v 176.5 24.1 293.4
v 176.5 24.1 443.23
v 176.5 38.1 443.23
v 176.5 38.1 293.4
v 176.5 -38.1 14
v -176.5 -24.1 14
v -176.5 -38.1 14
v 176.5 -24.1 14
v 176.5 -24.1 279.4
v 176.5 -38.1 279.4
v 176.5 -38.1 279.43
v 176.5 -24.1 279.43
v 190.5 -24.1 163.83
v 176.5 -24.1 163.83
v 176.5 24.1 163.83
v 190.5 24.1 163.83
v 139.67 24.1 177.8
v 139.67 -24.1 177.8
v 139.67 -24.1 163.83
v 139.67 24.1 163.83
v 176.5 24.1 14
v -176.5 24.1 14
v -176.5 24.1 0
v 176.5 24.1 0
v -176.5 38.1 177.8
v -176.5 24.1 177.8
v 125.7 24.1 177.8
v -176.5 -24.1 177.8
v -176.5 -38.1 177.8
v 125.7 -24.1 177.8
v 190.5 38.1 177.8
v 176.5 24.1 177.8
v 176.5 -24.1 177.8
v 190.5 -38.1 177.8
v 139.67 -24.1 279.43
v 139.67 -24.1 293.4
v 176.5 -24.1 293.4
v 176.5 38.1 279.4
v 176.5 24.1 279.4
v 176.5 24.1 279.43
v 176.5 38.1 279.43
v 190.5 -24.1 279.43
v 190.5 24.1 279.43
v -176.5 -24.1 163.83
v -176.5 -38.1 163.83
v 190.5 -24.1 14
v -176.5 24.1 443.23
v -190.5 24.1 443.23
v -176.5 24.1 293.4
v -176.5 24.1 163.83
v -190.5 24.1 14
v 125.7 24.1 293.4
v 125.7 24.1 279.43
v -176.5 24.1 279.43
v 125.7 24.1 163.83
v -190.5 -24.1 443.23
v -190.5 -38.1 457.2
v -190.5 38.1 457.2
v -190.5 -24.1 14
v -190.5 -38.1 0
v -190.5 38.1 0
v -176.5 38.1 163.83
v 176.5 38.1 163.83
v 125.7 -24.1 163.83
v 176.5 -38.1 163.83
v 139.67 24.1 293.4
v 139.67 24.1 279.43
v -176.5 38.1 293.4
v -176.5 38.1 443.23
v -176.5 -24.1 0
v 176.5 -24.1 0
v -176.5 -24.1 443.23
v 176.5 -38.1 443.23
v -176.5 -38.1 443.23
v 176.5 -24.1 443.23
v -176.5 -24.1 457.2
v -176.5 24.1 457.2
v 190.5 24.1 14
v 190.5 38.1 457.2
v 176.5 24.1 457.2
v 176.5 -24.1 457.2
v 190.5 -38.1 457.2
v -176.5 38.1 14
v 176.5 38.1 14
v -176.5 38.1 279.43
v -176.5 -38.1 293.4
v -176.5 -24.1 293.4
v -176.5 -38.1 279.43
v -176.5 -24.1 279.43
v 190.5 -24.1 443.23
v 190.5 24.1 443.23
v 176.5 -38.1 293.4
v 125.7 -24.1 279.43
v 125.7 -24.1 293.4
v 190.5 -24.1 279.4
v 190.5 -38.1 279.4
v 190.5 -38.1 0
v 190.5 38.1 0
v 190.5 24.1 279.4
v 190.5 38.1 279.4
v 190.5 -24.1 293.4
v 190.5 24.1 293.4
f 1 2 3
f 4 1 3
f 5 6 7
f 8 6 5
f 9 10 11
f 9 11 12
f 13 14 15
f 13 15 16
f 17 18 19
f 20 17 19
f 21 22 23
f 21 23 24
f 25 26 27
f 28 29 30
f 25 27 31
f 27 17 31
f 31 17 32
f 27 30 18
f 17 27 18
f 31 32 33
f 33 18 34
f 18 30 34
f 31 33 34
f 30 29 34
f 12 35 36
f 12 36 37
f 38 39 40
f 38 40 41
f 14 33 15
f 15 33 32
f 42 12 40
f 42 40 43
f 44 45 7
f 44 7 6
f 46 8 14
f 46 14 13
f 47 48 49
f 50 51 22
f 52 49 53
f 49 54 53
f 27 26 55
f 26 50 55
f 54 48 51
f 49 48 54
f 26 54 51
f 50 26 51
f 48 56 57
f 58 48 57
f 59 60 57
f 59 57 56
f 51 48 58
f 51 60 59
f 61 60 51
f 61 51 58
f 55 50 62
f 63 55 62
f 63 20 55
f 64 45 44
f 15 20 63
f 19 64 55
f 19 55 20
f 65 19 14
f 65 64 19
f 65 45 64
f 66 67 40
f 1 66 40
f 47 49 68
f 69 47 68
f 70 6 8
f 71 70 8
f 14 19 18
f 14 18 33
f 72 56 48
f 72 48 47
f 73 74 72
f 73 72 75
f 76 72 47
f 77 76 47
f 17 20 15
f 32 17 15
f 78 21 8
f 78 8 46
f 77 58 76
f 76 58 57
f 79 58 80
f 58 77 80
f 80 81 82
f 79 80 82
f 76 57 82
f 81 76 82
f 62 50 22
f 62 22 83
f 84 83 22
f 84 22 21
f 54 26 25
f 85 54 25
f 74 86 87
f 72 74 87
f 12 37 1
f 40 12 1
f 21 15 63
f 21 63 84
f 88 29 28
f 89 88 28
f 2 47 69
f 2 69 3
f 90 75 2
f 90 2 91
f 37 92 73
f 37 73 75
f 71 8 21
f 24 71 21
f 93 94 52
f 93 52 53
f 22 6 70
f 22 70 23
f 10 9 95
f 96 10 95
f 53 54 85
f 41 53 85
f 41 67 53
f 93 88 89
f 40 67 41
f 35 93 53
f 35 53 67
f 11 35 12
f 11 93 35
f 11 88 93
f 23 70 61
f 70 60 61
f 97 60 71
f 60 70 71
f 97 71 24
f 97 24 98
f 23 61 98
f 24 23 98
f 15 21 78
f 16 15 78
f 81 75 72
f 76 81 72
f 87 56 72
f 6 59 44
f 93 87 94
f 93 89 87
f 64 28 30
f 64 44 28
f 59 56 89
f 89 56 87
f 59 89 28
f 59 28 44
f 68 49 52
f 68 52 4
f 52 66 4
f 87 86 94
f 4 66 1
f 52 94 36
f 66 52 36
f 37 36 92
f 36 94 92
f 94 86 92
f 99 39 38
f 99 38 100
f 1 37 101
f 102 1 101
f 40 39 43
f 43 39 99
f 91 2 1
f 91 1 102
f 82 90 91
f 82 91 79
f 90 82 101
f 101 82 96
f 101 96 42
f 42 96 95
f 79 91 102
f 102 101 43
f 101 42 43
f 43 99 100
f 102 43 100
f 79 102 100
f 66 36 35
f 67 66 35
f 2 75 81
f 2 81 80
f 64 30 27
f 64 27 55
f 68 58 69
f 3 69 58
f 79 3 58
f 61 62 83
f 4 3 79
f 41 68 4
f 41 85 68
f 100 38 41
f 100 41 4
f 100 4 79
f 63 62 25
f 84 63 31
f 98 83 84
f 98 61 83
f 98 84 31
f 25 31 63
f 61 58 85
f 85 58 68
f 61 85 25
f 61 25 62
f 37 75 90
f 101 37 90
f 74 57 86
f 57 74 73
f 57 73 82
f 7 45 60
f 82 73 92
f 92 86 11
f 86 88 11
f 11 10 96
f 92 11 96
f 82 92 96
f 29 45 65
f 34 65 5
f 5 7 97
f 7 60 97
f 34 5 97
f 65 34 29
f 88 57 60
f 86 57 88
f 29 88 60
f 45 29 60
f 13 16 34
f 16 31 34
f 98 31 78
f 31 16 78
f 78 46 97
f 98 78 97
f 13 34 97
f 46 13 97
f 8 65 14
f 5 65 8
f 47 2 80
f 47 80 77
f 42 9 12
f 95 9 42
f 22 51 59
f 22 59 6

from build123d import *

# Parameters (mm, degrees)
SKETCH1_W               = 381
SKETCH1_H               = 76.2
BOSS_EXTRUDE1_DEPTH     = 14
SKETCH2_W               = 353.0000052
SKETCH2_H               = 48.2
CUT_EXTRUDE1_DEPTH      = 14
SKETCH5_W               = 381
SKETCH5_H               = 13.97
BOSS_EXTRUDE2_DEPTH     = 76.2
SKETCH6_W               = 353.0000052
SKETCH6_H               = 48.2
CUT_EXTRUDE2_DEPTH      = 76.2
SKETCH3_W               = 13.9999974
SKETCH3_H               = 14
BOSS_EXTRUDE3_DEPTH     = 429.26
SKETCH7_W               = 13.9999974
SKETCH7_H               = 101.6
CUT_EXTRUDE3_DEPTH      = 429.26
SKETCH10_W              = 13.9999974
SKETCH10_H              = 13.97
BOSS_EXTRUDE4_DEPTH     = 48.26
SKETCH11_W              = 353.0000052
SKETCH11_H              = 13.97
BOSS_EXTRUDE5_DEPTH     = 76.2
CUT_EXTRUDE4_DEPTH      = 352.863349754
CUT_EXTRUDE4_DEPTH_BACK = 352.863349754
SKETCH12_W              = 353.0000052
SKETCH12_H              = 48.2
SKETCH13_W              = 13.97
SKETCH13_H              = 13.97
BOSS_EXTRUDE6_DEPTH     = 48.26


with BuildPart() as part:
    # Sketch1 → Boss-Extrude1 (new body)
    with BuildSketch(Plane.XY):
        Rectangle(SKETCH1_W, SKETCH1_H)
    extrude(amount=BOSS_EXTRUDE1_DEPTH)

    # Sketch2 → Cut-Extrude1 (cut)
    with BuildSketch(Plane.XY.offset(14)):
        Rectangle(SKETCH2_W, SKETCH2_H)
    extrude(amount=-CUT_EXTRUDE1_DEPTH, mode=Mode.SUBTRACT)



with BuildPart() as body_2:
    # Sketch5 → Boss-Extrude2 (new body)
    with BuildSketch(Plane(origin=(0, -38.1, 0), x_dir=(1, 0, 0), z_dir=(0, 1, 0))):
        with Locations((0, -450.215)):
            Rectangle(SKETCH5_W, SKETCH5_H)
    extrude(amount=BOSS_EXTRUDE2_DEPTH)

    # Sketch6 → Cut-Extrude2 (cut)
    with BuildSketch(Plane(origin=(0, 0, 443.23), x_dir=(-1, 0, 0), z_dir=(0, 0, -1))):
        Rectangle(SKETCH6_W, SKETCH6_H)
    extrude(amount=-CUT_EXTRUDE2_DEPTH, mode=Mode.SUBTRACT)


with BuildPart() as part_1:
    add(part.part)

    add(body_2.part)  # Boss-Extrude3 merges body 2
    # Sketch3 → Boss-Extrude3 (add)
    with BuildSketch(Plane.XY.offset(14)):
        with Locations((-183.5000013, -31.1)):
            Rectangle(SKETCH3_W, SKETCH3_H)
        with Locations((-183.5000013, 31.1)):
            Rectangle(SKETCH3_W, SKETCH3_H)
        with Locations((183.5000013, -31.1)):
            Rectangle(SKETCH3_W, SKETCH3_H)
        with Locations((183.5000013, 31.1)):
            Rectangle(SKETCH3_W, SKETCH3_H)
    extrude(amount=BOSS_EXTRUDE3_DEPTH)

    # Sketch7 → Cut-Extrude3 (cut)
    with BuildSketch(Plane(origin=(0, 38.1, 0), x_dir=(1, 0, 0), z_dir=(0, 1, 0))):
        with Locations((183.5000013, -228.6)):
            Rectangle(SKETCH7_W, SKETCH7_H)
    extrude(amount=-CUT_EXTRUDE3_DEPTH, mode=Mode.SUBTRACT)

    # Sketch10 → Boss-Extrude4 (add)
    with BuildSketch(Plane(origin=(0, -24.1, 0), x_dir=(1, 0, 0), z_dir=(0, 1, 0))):
        with Locations((183.5000013, -170.815)):
            Rectangle(SKETCH10_W, SKETCH10_H)
        with Locations((183.5000013, -286.415)):
            Rectangle(SKETCH10_W, SKETCH10_H)
    extrude(amount=BOSS_EXTRUDE4_DEPTH)

    # Sketch11 → Boss-Extrude5 (add)
    with BuildSketch(Plane(origin=(0, -38.1, 0), x_dir=(1, 0, 0), z_dir=(0, 1, 0))):
        with Locations((0, -170.815)):
            Rectangle(SKETCH11_W, SKETCH11_H)
        with Locations((0, -286.415)):
            Rectangle(SKETCH11_W, SKETCH11_H)
    extrude(amount=BOSS_EXTRUDE5_DEPTH)

    # Sketch12 → Cut-Extrude4 (cut, two sides: drawn at the far end of the back side and taken through both)
    with BuildSketch(Plane(origin=(0, 0, 163.83), x_dir=(-1, 0, 0), z_dir=(0, 0, -1)).offset(-CUT_EXTRUDE4_DEPTH_BACK)):
        Rectangle(SKETCH12_W, SKETCH12_H)
    extrude(amount=CUT_EXTRUDE4_DEPTH + CUT_EXTRUDE4_DEPTH_BACK, mode=Mode.SUBTRACT)

    # Sketch13 → Boss-Extrude6 (add)
    with BuildSketch(Plane(origin=(0, -24.1, 0), x_dir=(1, 0, 0), z_dir=(0, 1, 0))):
        with Locations((132.6850026, -286.415)):
            Rectangle(SKETCH13_W, SKETCH13_H)
        with Locations((132.6850026, -170.815)):
            Rectangle(SKETCH13_W, SKETCH13_H)
    extrude(amount=BOSS_EXTRUDE6_DEPTH)


solid = part_1.part
